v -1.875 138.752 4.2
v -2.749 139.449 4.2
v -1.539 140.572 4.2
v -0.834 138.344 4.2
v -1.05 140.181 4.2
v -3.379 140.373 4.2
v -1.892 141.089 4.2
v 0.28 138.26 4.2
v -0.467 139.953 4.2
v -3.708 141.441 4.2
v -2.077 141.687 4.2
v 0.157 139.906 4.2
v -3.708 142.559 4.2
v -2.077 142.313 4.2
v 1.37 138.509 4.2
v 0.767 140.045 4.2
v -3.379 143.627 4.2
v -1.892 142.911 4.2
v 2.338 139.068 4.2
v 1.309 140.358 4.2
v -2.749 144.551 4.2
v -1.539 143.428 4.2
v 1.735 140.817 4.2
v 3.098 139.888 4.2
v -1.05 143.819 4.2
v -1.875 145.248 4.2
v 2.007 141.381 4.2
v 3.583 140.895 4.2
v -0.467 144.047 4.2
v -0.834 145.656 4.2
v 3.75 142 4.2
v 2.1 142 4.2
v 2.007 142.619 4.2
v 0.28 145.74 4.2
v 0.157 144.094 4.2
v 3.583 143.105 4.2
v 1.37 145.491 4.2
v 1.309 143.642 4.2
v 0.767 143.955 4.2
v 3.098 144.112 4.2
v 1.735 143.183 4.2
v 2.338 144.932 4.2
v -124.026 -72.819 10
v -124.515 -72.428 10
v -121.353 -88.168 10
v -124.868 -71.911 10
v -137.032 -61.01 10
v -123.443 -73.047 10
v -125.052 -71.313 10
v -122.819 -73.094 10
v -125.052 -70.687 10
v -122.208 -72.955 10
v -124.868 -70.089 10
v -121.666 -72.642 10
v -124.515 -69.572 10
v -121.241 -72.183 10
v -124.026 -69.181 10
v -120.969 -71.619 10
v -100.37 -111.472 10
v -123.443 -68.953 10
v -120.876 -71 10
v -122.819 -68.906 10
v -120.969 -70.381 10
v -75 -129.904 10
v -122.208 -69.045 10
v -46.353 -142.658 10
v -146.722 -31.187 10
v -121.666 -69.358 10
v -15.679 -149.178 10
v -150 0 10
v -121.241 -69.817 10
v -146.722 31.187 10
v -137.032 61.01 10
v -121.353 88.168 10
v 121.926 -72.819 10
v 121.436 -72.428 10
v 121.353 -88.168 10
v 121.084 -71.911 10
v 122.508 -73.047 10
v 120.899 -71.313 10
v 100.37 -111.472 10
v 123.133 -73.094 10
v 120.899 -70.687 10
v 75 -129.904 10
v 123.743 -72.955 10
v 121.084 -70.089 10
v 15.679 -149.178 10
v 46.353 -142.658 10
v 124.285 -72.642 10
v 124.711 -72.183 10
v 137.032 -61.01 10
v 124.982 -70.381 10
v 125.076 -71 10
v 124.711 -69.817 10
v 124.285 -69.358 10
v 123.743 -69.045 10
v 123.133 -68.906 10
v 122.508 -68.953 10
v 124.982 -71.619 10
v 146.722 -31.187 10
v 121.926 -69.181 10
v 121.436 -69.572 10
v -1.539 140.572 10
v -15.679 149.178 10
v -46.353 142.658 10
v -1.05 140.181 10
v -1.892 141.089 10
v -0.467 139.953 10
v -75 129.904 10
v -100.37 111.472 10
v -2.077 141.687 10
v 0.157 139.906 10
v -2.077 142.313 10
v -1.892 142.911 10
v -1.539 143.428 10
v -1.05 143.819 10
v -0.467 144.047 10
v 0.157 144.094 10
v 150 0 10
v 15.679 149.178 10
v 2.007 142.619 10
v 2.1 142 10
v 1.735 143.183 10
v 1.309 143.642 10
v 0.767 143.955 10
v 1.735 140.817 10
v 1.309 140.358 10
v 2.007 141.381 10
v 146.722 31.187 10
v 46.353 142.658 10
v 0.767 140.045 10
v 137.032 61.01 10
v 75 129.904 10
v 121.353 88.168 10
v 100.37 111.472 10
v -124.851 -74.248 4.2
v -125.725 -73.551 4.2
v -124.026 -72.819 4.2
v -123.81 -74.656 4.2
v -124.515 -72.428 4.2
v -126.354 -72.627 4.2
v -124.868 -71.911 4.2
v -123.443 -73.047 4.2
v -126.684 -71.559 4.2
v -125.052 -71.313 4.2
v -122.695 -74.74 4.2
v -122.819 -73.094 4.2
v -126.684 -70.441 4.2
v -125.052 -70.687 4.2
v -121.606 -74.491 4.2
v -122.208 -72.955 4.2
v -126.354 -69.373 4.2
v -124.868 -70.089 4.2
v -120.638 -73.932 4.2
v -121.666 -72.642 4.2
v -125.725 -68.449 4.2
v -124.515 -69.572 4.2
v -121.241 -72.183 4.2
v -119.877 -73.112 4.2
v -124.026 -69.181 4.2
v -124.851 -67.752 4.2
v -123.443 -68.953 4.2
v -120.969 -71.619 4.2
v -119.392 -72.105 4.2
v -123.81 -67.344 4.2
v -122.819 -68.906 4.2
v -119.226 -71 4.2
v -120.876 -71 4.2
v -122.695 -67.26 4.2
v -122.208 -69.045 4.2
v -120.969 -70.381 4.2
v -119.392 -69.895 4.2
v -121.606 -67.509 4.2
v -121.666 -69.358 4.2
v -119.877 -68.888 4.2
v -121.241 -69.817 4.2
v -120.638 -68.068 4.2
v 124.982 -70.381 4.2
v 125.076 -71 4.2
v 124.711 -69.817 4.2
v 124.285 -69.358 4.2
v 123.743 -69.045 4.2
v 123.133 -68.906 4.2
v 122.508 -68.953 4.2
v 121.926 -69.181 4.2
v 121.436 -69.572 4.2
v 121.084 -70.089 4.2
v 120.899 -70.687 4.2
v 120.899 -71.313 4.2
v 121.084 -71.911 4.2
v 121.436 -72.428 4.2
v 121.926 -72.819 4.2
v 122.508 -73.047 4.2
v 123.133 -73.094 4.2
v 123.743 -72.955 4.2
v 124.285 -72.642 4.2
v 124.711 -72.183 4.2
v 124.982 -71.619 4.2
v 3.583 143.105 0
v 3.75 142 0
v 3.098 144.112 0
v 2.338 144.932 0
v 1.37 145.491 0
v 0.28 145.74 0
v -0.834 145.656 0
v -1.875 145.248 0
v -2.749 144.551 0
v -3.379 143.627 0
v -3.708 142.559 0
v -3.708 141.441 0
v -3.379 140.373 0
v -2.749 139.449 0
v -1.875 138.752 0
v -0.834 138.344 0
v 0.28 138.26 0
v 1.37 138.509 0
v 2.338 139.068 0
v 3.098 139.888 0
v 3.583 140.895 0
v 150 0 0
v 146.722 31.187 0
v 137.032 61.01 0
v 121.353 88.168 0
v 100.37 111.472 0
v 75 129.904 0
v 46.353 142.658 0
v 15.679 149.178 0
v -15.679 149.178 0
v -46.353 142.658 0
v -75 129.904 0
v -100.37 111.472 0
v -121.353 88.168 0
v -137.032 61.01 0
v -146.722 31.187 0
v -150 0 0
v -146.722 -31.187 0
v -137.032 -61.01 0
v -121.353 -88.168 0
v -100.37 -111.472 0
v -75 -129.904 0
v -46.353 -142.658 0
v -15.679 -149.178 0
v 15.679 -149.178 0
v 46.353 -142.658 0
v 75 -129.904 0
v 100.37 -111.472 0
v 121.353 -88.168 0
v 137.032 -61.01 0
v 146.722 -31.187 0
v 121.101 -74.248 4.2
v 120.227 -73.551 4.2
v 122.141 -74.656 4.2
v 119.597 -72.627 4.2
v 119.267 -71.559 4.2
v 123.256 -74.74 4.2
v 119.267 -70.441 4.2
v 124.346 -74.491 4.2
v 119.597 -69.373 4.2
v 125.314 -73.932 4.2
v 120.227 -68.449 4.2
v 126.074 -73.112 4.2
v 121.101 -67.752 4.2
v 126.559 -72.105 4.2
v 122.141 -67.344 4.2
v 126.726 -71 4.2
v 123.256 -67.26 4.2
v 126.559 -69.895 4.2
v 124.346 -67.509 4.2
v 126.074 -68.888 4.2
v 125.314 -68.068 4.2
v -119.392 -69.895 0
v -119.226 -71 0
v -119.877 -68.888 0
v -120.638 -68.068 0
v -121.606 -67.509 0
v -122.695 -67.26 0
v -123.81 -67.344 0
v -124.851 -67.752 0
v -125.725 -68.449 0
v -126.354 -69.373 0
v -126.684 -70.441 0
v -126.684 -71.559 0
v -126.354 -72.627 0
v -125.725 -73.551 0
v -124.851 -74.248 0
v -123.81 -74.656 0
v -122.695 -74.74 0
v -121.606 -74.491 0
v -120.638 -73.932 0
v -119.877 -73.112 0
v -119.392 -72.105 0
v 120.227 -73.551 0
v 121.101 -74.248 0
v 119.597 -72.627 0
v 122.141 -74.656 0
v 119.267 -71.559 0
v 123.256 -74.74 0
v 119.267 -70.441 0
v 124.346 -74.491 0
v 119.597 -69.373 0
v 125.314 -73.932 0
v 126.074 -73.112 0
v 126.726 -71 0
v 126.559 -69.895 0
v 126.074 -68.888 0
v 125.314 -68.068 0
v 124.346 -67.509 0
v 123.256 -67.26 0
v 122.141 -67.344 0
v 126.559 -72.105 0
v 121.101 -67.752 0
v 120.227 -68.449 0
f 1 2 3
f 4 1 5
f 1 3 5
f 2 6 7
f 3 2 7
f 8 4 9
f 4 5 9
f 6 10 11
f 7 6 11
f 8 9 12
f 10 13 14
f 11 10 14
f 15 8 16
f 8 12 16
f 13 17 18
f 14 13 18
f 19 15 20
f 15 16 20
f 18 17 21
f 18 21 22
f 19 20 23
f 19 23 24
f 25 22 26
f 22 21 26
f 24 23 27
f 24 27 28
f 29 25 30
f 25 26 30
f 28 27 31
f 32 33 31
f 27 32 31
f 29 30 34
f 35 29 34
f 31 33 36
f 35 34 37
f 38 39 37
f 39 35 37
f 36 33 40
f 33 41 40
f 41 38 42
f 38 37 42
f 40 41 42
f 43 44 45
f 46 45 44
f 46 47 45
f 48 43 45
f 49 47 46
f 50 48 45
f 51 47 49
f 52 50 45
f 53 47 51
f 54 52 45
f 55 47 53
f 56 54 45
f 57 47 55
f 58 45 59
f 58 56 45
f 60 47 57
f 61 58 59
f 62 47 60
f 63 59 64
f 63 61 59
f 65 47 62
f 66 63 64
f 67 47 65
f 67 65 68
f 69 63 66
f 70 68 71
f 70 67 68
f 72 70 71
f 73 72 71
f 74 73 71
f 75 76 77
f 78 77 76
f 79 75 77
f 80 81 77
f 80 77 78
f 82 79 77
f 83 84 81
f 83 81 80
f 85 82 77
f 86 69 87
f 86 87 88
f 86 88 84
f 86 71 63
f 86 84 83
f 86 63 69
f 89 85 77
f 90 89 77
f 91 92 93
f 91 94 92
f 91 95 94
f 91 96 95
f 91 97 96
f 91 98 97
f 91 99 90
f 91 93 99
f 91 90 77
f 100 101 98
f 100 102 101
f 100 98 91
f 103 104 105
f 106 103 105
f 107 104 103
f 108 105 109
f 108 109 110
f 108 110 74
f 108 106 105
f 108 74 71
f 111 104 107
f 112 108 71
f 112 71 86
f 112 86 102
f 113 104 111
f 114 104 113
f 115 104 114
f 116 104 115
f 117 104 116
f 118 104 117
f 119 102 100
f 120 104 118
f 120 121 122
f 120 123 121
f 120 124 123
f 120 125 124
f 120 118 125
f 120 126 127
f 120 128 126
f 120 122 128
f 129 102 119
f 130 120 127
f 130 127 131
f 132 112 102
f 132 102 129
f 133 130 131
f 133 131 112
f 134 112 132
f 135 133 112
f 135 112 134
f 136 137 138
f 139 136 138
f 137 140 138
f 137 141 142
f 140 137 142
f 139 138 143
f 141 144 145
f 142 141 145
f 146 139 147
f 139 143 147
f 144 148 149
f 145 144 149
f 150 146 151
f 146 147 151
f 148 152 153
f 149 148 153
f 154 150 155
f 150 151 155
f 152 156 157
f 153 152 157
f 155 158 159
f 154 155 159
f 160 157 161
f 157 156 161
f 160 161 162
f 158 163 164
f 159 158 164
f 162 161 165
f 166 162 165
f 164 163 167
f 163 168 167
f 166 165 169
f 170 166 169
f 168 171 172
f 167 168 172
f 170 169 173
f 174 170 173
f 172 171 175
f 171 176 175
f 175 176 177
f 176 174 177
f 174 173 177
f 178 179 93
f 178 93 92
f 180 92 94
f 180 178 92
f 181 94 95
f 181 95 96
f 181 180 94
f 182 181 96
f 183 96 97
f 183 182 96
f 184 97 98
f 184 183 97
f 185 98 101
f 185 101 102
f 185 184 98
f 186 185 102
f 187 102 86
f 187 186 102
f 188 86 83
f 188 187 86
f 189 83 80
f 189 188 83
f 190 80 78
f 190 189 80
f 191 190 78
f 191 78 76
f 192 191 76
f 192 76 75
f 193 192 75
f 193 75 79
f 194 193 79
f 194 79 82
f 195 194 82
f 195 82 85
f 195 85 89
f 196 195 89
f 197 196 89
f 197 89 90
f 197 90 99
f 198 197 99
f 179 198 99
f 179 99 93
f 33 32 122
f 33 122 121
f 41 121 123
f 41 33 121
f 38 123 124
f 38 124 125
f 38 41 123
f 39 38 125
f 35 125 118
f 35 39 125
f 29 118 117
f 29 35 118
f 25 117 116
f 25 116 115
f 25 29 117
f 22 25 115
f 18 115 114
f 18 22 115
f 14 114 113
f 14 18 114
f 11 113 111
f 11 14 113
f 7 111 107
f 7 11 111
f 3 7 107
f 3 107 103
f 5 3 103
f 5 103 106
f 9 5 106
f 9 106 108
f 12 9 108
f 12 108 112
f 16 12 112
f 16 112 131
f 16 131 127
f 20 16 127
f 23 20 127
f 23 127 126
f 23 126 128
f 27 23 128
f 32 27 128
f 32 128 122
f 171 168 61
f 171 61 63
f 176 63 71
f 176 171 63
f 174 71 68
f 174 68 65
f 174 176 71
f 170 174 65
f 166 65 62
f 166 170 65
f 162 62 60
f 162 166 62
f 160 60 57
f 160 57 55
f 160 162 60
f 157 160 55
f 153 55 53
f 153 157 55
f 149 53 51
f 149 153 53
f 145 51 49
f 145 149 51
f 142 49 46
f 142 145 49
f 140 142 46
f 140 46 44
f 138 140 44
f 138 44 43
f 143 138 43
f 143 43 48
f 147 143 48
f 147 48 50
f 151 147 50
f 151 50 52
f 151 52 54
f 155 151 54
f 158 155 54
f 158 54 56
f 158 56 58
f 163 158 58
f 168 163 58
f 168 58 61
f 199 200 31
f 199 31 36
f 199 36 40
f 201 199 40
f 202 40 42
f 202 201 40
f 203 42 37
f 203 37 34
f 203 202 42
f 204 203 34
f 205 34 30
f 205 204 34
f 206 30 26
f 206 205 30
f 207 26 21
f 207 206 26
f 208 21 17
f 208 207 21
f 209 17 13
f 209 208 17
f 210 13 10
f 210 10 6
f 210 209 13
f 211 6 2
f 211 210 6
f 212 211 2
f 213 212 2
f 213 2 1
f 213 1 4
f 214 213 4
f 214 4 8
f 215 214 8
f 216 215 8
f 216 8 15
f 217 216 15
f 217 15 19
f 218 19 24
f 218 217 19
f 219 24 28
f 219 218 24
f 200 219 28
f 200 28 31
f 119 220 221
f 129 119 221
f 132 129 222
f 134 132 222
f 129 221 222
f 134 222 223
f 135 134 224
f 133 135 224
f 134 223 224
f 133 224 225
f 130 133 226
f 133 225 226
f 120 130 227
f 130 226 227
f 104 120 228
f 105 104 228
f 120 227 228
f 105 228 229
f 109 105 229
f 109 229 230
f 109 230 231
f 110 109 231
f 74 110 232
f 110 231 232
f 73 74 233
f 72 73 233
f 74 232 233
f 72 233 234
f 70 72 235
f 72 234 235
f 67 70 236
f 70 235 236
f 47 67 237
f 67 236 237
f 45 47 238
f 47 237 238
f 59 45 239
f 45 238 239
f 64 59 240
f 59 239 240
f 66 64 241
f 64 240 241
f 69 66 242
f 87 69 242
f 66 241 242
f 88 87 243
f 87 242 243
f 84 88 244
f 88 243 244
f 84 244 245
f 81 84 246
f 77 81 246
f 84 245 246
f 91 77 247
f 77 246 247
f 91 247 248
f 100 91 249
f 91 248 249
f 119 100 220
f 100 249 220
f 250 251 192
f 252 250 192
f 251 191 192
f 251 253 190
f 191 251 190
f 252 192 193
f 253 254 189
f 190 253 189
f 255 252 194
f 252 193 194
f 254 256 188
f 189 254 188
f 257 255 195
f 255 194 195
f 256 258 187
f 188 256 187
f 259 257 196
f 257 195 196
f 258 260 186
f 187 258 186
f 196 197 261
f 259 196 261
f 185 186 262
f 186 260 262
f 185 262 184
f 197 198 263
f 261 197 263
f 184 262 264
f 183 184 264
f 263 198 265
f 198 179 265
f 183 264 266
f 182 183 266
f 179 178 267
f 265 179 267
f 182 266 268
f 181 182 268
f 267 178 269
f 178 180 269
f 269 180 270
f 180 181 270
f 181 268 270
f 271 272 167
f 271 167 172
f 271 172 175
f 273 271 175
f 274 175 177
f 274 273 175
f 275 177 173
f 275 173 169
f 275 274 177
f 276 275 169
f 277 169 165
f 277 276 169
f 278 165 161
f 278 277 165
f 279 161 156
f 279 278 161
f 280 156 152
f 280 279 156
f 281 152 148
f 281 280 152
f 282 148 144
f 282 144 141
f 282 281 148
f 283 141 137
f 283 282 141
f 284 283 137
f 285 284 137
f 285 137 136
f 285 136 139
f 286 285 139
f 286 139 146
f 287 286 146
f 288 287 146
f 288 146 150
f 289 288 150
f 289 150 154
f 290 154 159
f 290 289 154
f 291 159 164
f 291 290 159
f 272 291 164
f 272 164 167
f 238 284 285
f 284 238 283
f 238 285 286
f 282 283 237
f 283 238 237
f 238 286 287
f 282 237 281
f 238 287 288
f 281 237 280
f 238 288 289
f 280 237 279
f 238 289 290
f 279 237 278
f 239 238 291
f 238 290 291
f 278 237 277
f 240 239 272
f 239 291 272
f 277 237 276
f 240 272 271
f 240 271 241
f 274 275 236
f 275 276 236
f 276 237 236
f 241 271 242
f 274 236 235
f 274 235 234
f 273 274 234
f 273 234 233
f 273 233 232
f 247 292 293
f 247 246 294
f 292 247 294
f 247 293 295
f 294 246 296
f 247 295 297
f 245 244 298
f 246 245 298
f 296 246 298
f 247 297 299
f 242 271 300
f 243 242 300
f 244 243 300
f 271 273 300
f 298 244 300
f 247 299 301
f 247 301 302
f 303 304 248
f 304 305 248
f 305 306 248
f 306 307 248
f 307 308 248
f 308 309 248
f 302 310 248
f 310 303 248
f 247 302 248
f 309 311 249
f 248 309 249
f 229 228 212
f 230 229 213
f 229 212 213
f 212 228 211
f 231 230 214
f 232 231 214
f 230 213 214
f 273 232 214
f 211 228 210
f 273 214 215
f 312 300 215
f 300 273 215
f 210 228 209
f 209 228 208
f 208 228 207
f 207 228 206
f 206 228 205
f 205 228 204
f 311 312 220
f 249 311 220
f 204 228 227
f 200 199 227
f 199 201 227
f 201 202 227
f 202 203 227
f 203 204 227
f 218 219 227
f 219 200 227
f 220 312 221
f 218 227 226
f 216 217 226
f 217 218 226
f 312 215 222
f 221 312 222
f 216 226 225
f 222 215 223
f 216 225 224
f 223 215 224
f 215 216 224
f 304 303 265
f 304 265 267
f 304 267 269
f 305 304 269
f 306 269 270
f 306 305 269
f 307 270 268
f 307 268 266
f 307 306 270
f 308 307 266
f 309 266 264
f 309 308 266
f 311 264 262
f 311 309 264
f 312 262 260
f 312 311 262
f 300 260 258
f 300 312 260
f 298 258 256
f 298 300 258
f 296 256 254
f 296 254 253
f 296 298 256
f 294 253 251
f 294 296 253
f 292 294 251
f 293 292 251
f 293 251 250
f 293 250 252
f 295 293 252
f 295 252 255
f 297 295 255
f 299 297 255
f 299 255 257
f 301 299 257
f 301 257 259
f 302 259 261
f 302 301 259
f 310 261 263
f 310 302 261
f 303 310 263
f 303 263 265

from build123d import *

# Parameters (mm, degrees)
F0_R     = 150
F0_R_2   = 3.75
F0_R_3   = 2.1
F1_DEPTH = 10
F2_DEPTH = 4.2


with BuildPart() as f1:
    # F0 (on Top) → F1 (new body)
    with BuildSketch(Plane.XY):
        Circle(F0_R)
        with Locations((-122.975607, -71)):
            Circle(F0_R_2, mode=Mode.SUBTRACT)
        with Locations((122.975607, -71)):
            Circle(F0_R_2, mode=Mode.SUBTRACT)
        with Locations((0, 142)):
            Circle(F0_R_2, mode=Mode.SUBTRACT)
        with Locations((0, 142)):
            Circle(F0_R_2)
        with Locations((0, 142)):
            Circle(F0_R_3, mode=Mode.SUBTRACT)
        with Locations((122.975607, -71)):
            Circle(F0_R_2)
        with Locations((122.975607, -71)):
            Circle(F0_R_3, mode=Mode.SUBTRACT)
        with Locations((-122.975607, -71)):
            Circle(F0_R_2)
        with Locations((-122.975607, -71)):
            Circle(F0_R_3, mode=Mode.SUBTRACT)
    extrude(amount=F1_DEPTH)

    # F0 (on Top) → F2 (cut)
    with BuildSketch(Plane.XY):
        with Locations((-122.975607, -71)):
            Circle(F0_R_2)
        with Locations((-122.975607, -71)):
            Circle(F0_R_3, mode=Mode.SUBTRACT)
        with Locations((122.975607, -71)):
            Circle(F0_R_2)
        with Locations((122.975607, -71)):
            Circle(F0_R_3, mode=Mode.SUBTRACT)
        with Locations((0, 142)):
            Circle(F0_R_2)
        with Locations((0, 142)):
            Circle(F0_R_3, mode=Mode.SUBTRACT)
    extrude(amount=F2_DEPTH, mode=Mode.SUBTRACT)


solid = f1.part
